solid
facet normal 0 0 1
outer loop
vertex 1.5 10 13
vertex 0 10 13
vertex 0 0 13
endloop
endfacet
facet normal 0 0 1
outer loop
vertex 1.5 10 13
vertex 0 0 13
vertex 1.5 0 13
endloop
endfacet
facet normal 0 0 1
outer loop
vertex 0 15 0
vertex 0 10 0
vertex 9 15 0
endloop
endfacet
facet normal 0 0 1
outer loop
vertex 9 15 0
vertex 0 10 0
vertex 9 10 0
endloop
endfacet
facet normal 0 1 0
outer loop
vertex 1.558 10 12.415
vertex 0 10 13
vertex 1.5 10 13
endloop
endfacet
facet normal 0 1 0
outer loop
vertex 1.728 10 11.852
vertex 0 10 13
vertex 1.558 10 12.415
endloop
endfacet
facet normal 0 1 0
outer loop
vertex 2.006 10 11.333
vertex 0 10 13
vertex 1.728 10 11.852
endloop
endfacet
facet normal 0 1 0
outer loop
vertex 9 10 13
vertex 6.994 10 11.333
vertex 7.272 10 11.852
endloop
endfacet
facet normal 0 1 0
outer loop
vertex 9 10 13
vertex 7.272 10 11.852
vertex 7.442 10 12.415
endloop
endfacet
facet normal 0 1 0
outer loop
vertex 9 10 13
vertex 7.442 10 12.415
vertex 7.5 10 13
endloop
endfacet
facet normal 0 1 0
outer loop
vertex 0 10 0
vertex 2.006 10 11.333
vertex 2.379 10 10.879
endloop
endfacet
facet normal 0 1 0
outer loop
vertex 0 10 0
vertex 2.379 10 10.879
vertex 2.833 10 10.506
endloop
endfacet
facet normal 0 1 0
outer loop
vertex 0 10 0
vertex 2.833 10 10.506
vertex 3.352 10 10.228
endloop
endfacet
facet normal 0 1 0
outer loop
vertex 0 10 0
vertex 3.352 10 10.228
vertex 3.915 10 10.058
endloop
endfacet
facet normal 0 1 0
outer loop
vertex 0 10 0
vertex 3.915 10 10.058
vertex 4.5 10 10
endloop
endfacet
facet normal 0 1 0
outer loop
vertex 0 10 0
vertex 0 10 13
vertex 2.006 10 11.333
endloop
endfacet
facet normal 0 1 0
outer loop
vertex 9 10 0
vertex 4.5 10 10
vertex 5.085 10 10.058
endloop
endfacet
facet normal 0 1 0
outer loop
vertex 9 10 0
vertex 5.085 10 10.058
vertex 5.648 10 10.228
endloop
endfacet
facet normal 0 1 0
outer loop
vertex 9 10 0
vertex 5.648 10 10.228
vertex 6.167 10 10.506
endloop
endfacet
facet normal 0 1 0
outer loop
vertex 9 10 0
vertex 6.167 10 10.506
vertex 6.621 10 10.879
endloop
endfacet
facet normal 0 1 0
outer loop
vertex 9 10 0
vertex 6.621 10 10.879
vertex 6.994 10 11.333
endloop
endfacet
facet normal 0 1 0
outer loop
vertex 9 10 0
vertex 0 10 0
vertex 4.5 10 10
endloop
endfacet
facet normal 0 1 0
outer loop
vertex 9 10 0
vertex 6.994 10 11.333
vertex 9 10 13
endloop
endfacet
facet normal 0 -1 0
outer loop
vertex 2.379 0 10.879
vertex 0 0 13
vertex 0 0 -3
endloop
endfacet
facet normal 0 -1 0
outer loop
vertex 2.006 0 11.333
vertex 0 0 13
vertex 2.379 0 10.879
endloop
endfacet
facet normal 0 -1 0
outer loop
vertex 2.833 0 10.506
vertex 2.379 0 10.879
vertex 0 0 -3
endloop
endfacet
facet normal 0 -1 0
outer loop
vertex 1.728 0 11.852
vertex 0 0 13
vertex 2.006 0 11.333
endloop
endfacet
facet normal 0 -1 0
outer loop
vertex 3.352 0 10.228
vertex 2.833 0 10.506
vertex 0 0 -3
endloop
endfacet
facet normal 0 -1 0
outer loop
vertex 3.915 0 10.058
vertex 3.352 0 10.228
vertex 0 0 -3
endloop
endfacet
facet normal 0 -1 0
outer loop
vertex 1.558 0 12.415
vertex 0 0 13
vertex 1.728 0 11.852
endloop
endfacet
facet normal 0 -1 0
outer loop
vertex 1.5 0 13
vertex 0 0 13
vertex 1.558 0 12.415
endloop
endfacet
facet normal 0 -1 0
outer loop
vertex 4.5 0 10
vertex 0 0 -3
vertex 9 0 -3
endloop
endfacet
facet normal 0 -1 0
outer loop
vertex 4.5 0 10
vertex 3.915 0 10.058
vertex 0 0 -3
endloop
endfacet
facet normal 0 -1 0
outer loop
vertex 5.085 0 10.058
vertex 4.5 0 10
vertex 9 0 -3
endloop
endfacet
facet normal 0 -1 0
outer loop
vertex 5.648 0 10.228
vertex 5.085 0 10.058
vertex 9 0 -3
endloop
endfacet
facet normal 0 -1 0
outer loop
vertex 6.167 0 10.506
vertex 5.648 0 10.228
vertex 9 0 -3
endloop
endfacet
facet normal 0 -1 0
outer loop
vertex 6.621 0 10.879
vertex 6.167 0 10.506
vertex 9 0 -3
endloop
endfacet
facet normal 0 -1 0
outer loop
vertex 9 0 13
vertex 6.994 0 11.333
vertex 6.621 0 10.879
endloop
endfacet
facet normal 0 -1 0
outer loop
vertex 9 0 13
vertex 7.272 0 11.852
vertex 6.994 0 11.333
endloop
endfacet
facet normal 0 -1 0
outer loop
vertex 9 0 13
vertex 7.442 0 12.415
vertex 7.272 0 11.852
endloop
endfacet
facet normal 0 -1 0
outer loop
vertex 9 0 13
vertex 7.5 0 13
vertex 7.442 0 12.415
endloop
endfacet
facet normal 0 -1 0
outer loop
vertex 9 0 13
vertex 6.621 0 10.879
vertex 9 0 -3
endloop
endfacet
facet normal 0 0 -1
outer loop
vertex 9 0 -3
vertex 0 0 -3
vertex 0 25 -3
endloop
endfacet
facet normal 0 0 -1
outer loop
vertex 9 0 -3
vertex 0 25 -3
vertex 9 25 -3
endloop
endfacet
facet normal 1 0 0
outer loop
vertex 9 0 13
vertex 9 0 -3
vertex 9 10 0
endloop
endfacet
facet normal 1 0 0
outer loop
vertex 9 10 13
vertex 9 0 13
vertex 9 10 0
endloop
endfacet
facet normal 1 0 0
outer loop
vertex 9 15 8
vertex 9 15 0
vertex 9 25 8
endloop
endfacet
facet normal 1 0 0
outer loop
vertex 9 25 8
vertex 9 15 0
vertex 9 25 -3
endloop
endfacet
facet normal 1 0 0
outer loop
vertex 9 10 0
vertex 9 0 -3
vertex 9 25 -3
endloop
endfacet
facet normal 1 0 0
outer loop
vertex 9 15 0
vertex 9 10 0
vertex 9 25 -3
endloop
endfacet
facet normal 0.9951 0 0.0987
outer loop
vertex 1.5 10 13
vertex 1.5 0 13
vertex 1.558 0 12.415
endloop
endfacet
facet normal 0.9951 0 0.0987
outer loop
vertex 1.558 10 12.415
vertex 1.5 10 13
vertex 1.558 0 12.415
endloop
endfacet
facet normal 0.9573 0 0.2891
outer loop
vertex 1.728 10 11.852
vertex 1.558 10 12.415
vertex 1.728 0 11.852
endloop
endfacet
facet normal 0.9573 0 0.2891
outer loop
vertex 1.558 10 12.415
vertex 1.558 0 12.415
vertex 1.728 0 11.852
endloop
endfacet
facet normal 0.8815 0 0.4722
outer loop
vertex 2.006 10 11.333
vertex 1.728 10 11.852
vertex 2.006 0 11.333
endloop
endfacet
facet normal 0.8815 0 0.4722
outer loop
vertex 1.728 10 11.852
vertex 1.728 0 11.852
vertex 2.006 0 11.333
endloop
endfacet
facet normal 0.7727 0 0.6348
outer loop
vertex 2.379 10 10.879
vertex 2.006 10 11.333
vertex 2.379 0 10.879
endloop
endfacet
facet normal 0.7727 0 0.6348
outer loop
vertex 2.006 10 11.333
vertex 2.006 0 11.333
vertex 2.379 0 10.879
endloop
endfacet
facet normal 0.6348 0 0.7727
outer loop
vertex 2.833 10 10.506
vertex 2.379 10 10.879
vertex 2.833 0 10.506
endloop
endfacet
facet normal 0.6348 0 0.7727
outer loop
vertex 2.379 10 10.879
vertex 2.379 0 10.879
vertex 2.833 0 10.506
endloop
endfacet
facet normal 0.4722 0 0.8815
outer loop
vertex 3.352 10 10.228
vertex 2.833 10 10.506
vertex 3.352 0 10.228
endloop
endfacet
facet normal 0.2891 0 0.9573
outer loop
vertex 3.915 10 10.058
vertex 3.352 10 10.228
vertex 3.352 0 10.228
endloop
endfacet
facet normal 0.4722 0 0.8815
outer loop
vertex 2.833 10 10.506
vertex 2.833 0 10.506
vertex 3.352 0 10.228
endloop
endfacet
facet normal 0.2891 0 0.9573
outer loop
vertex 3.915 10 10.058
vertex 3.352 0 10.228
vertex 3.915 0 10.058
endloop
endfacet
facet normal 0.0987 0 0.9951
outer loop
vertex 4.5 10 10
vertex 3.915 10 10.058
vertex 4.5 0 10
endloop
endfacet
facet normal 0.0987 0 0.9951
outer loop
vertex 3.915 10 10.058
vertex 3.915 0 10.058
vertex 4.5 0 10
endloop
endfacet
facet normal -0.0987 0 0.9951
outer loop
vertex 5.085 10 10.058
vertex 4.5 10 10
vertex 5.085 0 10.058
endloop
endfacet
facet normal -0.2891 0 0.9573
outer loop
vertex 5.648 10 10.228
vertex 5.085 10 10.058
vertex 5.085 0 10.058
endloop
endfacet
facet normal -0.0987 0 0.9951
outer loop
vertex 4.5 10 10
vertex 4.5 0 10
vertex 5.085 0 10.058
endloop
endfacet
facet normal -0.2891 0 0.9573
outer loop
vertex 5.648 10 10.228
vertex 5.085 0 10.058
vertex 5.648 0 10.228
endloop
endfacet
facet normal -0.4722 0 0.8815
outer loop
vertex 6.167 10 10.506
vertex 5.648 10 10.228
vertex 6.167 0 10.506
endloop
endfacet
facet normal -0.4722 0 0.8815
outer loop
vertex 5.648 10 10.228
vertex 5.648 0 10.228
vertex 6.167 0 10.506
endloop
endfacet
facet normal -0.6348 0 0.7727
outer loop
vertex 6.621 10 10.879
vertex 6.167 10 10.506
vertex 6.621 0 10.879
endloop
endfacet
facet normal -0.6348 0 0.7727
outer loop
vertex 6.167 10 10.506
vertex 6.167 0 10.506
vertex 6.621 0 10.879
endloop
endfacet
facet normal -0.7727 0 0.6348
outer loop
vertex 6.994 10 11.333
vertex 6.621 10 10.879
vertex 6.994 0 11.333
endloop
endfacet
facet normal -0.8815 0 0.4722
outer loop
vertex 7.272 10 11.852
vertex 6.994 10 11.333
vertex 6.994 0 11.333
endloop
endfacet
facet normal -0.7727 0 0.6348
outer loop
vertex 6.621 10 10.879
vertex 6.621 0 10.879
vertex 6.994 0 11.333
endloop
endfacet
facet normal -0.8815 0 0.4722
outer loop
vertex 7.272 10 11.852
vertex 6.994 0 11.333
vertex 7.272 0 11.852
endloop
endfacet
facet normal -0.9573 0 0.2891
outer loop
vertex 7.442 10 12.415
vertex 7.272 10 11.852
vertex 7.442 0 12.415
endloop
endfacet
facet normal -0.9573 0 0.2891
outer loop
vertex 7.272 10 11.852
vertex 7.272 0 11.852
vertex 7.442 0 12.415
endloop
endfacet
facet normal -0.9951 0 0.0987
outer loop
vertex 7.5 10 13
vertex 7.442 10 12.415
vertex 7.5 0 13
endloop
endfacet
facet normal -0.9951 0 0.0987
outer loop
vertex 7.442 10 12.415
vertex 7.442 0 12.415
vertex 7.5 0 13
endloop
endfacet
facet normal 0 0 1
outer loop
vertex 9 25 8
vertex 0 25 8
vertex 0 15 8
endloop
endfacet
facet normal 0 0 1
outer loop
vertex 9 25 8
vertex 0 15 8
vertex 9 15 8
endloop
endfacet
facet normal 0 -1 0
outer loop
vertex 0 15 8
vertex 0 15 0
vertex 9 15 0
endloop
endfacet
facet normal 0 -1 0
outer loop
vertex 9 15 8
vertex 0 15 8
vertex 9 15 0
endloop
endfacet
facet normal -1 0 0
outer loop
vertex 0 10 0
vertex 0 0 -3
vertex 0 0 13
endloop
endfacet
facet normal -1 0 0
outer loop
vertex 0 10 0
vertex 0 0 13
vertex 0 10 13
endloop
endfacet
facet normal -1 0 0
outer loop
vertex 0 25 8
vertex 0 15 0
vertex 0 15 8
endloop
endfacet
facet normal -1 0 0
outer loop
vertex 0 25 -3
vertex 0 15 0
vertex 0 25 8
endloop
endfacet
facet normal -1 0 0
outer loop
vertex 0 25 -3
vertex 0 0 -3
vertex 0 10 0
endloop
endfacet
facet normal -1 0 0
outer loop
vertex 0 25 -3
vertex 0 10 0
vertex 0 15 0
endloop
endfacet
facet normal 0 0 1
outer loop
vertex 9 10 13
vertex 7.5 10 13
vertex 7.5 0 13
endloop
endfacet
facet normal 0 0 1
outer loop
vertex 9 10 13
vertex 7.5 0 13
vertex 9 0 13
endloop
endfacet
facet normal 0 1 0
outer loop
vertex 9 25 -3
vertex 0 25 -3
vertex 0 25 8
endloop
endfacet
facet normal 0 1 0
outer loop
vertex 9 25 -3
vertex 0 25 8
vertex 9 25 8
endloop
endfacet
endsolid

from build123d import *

# Parameters (mm, degrees)
F0_W     = 9
F0_H     = 10
F1_DEPTH = 13
F3_DEPTH = 25
F4_W     = 9
F4_H     = 10
F4_H_2   = 15
F5_DEPTH = 3
F6_W     = 9
F6_H     = 10
F7_DEPTH = 8


# Not quite as in the source:
# - a feature names something its author has since deleted; it is built from what else it names


with BuildPart() as f1:
    # F0 (on Top) → F1 (new body)
    with BuildSketch(Plane.XY):
        with Locations((4.5, 5)):
            Rectangle(F0_W, F0_H)
    extrude(amount=F1_DEPTH)

    # F2 (on face) → F3 (cut)
    with BuildSketch(Plane.XZ):
        with BuildLine():
            ThreePointArc((1.5, 13), (4.5, 10), (7.5, 13))
            Line((7.5, 13), (1.5, 13))
        make_face()
    extrude(amount=-F3_DEPTH, mode=Mode.SUBTRACT)

    # F4 (on face) → F5 (join)
    with BuildSketch(Plane(origin=(0, 0, 0), x_dir=(1, 0, 0), z_dir=(0, 0, -1))):
        with Locations((4.5, -5)):
            Rectangle(F4_W, F4_H)
        with Locations((4.5, -17.5)):
            Rectangle(F4_W, F4_H_2)
    extrude(amount=F5_DEPTH)

    # F6 (on face) → F7 (join)
    with BuildSketch(Plane.XY):
        with Locations((4.5, 20)):
            Rectangle(F6_W, F6_H)
    extrude(amount=F7_DEPTH)


solid = f1.part
